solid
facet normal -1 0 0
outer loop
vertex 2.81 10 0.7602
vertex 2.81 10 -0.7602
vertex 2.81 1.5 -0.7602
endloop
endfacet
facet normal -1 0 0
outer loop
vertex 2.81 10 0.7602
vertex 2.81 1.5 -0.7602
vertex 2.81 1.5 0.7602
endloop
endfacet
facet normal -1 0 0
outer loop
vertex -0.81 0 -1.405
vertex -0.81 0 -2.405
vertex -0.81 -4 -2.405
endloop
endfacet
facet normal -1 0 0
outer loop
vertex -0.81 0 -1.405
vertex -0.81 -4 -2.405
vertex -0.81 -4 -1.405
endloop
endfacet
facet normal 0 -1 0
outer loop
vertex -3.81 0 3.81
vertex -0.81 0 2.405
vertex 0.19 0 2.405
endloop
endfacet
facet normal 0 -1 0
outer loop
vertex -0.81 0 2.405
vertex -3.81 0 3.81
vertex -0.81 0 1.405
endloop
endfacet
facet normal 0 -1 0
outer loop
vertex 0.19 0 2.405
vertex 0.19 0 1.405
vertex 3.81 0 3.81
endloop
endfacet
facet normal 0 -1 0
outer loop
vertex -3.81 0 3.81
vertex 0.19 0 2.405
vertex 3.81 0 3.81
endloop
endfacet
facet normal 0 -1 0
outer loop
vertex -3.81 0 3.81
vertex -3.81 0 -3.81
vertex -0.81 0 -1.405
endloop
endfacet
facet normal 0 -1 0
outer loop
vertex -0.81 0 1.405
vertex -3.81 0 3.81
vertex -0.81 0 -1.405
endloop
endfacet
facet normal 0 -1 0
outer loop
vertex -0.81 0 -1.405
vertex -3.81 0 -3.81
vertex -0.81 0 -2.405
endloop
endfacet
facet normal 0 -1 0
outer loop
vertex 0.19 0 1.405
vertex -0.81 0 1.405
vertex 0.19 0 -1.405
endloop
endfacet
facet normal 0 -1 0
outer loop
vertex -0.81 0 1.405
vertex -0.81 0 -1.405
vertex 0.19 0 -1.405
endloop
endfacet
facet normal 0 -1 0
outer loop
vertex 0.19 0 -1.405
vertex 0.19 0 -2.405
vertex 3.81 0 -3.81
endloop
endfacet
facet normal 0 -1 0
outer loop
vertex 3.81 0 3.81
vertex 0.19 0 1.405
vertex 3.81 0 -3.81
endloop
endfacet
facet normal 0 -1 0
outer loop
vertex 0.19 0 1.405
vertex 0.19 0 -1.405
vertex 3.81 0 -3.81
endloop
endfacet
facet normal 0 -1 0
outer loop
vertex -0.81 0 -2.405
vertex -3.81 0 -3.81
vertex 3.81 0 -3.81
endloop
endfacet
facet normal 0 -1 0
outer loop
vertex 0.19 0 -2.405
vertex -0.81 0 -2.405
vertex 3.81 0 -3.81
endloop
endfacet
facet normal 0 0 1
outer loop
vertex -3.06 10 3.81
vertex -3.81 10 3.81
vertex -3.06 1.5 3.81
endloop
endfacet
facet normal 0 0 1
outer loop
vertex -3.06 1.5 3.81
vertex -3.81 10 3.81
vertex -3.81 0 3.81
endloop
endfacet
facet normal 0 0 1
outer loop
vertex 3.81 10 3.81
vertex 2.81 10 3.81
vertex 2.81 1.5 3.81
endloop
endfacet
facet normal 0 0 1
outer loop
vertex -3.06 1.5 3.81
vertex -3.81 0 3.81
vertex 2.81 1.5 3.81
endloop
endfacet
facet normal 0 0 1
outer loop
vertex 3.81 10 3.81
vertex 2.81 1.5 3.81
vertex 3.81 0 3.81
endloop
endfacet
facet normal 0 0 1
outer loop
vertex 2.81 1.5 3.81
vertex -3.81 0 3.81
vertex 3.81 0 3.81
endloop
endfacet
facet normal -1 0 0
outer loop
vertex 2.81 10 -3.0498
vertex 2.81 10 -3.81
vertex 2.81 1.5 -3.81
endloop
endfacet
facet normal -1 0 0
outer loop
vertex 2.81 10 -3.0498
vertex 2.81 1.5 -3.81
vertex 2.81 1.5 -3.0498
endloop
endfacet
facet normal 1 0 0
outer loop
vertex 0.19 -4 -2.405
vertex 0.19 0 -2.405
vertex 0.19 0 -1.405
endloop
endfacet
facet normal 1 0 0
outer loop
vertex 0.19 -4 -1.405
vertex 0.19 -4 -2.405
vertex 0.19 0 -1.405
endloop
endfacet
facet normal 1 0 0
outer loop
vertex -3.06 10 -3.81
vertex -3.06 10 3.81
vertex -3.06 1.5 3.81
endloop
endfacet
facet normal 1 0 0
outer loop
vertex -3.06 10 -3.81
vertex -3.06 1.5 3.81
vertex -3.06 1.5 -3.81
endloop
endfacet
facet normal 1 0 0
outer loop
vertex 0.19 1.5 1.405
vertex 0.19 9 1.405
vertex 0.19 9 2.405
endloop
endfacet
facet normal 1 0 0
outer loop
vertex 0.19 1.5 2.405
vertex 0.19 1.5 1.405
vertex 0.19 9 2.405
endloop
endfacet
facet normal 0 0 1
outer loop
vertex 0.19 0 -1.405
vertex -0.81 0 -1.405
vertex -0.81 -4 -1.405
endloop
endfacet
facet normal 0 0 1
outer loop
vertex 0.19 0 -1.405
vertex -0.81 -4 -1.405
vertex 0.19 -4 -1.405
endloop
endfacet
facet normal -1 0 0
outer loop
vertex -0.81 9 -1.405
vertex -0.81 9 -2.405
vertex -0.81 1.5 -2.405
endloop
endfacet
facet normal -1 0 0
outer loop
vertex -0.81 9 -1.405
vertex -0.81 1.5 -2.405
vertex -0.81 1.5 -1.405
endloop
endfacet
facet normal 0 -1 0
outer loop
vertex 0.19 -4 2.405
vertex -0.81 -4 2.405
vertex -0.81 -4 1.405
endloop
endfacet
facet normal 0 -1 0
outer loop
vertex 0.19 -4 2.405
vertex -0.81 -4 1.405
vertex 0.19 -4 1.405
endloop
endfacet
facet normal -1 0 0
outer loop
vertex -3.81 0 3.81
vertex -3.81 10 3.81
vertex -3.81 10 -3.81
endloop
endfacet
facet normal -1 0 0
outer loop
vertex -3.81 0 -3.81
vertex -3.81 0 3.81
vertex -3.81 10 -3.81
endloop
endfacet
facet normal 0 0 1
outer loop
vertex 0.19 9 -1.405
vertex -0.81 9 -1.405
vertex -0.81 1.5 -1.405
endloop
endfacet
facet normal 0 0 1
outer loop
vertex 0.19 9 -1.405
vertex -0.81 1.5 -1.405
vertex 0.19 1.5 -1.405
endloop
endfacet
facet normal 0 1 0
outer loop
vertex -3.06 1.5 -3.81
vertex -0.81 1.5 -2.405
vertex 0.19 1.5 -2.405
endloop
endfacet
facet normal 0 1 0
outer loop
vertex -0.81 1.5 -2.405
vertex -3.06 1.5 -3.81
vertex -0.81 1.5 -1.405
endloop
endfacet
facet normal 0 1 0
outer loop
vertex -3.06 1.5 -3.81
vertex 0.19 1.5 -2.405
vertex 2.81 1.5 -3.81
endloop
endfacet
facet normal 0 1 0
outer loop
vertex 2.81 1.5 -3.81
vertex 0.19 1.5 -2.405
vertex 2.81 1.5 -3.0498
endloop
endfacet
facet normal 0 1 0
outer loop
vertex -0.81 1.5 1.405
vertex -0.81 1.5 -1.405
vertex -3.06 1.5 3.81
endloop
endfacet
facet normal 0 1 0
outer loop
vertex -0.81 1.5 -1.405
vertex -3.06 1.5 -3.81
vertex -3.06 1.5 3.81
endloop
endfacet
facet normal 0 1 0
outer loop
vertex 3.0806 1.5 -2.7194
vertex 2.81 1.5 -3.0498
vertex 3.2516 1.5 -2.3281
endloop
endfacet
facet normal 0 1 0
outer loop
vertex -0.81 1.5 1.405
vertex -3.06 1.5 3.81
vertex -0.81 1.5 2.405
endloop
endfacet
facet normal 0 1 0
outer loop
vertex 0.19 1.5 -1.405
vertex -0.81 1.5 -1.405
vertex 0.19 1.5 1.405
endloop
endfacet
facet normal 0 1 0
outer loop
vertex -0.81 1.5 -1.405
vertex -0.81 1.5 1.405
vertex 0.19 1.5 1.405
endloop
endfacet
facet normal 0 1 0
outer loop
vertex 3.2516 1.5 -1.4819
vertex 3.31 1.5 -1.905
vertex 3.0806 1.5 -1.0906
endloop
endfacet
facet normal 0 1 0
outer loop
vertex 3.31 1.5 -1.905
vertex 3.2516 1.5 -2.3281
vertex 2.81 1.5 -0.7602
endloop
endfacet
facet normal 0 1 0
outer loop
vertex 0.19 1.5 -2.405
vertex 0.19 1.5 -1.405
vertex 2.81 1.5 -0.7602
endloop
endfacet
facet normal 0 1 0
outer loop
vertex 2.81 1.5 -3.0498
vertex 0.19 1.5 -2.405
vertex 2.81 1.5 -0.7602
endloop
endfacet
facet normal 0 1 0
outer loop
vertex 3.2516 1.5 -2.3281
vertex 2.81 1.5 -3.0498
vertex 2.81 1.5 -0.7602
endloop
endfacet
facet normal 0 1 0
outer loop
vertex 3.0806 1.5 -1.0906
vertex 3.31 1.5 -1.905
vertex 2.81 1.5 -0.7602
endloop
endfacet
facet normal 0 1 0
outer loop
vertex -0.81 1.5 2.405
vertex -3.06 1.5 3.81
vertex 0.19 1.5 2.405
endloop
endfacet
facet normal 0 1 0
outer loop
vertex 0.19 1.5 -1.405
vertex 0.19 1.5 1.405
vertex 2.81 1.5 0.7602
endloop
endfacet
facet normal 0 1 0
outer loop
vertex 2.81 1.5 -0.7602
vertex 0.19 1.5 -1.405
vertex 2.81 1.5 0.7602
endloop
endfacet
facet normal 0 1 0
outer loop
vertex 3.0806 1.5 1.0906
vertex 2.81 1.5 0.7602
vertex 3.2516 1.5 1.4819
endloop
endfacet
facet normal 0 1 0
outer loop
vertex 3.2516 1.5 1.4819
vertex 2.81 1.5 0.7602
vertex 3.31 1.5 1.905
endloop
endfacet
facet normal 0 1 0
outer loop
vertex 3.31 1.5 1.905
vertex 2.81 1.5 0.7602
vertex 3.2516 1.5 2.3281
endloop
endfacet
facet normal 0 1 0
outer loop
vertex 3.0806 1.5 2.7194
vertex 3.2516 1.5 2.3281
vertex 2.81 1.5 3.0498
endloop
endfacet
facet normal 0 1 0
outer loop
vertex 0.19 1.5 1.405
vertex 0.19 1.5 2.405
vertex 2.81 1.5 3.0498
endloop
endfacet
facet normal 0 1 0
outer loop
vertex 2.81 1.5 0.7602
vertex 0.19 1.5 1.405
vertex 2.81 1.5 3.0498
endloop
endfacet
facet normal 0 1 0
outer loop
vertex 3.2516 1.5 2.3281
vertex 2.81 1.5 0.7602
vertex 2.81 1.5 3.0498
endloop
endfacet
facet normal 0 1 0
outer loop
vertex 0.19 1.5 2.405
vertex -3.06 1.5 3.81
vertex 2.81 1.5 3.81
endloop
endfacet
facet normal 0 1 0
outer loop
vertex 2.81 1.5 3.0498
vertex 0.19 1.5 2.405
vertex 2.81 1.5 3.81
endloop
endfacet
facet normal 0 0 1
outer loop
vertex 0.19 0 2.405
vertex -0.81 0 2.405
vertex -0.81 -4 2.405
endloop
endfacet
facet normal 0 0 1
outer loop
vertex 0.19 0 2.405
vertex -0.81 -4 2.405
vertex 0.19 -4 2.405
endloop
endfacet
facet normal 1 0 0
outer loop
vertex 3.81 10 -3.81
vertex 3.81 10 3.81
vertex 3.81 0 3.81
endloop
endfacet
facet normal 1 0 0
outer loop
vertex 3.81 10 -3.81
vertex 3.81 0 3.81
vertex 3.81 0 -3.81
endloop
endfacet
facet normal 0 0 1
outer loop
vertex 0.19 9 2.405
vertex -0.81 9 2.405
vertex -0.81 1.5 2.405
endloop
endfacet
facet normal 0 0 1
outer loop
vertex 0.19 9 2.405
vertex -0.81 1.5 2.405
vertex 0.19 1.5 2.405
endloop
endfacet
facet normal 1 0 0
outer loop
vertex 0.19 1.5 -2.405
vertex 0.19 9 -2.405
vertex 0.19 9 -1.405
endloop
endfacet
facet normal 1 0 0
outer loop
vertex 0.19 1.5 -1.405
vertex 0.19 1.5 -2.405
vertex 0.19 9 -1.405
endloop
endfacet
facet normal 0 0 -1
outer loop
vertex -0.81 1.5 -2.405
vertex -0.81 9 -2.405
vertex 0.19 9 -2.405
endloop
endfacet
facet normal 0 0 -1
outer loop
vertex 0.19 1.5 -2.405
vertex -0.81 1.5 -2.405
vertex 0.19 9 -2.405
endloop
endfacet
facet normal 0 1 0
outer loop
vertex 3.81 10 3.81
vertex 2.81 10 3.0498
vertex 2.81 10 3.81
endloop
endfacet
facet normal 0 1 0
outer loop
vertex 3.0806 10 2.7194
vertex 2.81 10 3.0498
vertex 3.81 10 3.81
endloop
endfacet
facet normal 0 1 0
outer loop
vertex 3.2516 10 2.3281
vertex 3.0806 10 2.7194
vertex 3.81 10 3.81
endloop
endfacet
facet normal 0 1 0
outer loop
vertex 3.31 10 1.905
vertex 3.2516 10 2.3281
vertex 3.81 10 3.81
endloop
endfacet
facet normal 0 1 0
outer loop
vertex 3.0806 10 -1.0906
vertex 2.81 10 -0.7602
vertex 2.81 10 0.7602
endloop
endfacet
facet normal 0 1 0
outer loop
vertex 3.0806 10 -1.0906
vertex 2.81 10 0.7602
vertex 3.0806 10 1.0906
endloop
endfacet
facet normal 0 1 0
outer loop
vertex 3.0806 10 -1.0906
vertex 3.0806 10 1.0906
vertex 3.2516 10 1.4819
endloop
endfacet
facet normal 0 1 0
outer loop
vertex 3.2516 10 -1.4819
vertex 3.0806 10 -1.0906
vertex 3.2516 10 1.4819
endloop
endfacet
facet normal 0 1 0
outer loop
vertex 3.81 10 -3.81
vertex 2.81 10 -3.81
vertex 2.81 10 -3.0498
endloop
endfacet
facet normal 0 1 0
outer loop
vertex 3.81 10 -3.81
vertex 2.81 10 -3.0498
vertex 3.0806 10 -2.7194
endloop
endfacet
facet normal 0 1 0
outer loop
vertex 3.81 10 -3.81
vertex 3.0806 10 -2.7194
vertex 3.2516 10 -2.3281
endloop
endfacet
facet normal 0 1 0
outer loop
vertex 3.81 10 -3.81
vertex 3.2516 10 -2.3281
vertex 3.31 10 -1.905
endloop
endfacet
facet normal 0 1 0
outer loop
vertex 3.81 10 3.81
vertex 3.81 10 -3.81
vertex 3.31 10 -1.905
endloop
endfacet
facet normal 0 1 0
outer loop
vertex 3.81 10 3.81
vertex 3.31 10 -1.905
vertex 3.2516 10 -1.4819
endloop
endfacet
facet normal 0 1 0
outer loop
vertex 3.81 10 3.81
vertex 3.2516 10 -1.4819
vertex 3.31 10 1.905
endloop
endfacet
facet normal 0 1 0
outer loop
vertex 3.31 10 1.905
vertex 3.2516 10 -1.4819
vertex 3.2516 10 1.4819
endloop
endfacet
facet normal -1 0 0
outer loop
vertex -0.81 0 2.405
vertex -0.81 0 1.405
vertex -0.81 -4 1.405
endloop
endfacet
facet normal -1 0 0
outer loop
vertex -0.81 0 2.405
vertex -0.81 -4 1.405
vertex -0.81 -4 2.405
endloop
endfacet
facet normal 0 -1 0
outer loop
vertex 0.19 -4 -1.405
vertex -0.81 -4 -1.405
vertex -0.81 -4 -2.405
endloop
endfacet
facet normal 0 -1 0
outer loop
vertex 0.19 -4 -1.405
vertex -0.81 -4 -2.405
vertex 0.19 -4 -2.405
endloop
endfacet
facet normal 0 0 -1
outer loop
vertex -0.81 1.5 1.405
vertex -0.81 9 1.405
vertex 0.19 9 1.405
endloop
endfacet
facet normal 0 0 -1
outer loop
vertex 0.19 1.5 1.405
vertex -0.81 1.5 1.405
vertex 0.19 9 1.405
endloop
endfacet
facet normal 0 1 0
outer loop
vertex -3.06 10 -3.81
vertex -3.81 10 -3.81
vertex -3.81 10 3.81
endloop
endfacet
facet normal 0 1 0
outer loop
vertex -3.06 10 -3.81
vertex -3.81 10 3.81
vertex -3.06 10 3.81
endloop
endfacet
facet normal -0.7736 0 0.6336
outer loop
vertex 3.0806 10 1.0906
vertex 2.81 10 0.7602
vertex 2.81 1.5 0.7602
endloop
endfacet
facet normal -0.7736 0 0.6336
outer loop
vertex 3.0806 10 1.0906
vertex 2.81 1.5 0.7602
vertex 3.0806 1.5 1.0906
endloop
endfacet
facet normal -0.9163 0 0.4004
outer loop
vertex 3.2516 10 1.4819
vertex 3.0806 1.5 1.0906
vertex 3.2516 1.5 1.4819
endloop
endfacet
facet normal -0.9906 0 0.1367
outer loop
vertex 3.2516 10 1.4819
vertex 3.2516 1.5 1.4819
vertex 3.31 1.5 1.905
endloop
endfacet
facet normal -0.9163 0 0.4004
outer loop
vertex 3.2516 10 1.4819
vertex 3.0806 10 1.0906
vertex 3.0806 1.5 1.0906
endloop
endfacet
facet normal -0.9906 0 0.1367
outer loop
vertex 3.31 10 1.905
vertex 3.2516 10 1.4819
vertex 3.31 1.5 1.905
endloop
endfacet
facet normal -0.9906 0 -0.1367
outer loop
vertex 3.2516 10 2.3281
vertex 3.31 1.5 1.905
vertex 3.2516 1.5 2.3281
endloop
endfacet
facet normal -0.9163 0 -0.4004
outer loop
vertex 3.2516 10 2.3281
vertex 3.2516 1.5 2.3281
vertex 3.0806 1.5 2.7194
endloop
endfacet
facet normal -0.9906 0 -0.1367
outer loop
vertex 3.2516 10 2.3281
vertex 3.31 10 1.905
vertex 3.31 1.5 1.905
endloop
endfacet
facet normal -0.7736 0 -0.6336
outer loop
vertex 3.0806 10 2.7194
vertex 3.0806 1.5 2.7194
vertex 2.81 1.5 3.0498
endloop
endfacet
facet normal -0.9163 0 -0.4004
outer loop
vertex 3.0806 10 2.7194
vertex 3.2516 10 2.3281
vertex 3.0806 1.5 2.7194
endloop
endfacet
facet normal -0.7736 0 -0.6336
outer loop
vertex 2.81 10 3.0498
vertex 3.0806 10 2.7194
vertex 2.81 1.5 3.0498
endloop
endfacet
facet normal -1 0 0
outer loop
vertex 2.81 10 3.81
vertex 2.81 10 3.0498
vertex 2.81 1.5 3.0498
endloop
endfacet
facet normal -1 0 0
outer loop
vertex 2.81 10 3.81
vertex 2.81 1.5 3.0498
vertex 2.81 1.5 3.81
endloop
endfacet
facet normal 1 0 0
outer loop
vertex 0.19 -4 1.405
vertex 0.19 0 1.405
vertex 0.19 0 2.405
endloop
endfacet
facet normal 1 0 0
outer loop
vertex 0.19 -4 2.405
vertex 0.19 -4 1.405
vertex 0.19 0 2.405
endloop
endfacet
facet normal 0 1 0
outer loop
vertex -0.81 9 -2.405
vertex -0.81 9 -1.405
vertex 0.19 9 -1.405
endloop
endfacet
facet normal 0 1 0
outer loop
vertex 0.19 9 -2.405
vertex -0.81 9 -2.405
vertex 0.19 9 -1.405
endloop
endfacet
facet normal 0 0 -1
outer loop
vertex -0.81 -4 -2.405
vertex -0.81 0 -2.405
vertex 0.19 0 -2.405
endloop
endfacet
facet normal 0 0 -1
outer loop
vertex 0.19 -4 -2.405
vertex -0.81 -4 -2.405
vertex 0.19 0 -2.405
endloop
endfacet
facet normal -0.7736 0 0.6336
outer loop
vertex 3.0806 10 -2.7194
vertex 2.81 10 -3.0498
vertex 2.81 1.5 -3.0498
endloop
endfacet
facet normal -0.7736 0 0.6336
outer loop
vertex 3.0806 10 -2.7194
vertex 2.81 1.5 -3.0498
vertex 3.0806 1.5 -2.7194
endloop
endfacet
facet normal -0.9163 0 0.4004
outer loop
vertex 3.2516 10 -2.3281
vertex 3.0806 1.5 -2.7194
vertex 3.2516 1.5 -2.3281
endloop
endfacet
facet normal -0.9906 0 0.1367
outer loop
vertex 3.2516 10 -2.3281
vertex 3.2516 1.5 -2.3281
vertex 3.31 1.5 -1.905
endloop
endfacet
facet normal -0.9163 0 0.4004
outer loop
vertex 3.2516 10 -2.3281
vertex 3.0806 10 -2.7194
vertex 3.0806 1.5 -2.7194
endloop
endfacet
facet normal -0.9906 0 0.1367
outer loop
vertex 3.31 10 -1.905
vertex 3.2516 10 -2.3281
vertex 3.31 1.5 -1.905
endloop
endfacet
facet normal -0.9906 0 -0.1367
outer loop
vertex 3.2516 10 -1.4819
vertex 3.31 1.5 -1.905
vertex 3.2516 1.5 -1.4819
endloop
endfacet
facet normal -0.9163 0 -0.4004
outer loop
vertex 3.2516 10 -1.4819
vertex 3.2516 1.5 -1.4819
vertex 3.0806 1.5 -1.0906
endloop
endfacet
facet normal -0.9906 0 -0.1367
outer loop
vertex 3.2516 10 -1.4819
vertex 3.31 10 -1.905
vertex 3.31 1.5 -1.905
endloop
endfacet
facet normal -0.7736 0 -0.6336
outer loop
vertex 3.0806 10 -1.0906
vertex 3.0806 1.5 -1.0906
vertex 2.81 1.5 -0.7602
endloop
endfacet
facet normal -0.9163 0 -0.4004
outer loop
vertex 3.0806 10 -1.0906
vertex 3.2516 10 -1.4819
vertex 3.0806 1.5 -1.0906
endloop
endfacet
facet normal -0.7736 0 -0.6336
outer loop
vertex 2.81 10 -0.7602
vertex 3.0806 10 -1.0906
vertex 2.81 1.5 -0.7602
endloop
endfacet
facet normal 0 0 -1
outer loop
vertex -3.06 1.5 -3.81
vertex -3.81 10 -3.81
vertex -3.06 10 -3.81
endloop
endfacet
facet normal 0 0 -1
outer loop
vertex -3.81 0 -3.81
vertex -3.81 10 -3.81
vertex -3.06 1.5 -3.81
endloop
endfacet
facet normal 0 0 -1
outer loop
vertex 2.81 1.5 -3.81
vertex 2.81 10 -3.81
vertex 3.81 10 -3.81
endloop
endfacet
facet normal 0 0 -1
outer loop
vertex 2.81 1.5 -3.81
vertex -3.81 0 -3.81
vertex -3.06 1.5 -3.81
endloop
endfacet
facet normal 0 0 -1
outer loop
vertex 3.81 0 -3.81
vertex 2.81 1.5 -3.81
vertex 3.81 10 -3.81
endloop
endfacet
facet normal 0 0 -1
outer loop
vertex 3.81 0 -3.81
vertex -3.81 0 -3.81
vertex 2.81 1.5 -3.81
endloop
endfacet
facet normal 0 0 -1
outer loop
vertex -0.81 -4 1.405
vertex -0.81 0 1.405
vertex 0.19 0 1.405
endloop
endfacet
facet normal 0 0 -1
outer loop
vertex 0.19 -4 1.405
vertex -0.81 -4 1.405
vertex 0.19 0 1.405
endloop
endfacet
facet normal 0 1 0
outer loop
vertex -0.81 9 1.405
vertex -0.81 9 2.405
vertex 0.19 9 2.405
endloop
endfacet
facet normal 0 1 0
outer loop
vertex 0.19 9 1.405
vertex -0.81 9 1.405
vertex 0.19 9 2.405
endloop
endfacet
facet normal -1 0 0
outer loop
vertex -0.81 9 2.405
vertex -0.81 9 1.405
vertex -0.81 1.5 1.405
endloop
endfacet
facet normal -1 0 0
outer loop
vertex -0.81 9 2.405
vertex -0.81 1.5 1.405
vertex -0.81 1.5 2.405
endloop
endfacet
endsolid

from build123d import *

# Parameters (mm, degrees)
SKETCH_1_W           = 7.62
SKETCH_1_H           = 7.62
EXTRUDE_1_DEPTH      = 10
CUT_EXTRUDE_1_DEPTH  = 8.5
EXTRUDE_2_DEPTH      = 4
EXTRUDE_2_DEPTH_BACK = 9
SKETCH_3_W           = 1
SKETCH_3_H           = 1


with BuildPart() as part:
    # 草图1 → 拉伸1 (new body)
    with BuildSketch(Plane(origin=(0, 0, 0), x_dir=(1, 0, 0), z_dir=(0, 1, 0))):
        Rectangle(SKETCH_1_W, SKETCH_1_H)
    extrude(amount=EXTRUDE_1_DEPTH)

    # 草图2 → 切除-拉伸1 (cut)
    with BuildSketch(Plane(origin=(0, 10, 0), x_dir=(-1, 0, 0), z_dir=(0, 1, 0))):
        with BuildLine():
            Line((-2.81, -3.81), (-2.81, -3.049818304))
            ThreePointArc((-2.81, -3.049818304), (-3.31, -1.905), (-2.81, -0.760181696))
            Line((-2.81, -0.760181696), (-2.81, 0.760181696))
            ThreePointArc((-2.81, 0.760181696), (-3.31, 1.905), (-2.81, 3.049818304))
            Line((-2.81, 3.049818304), (-2.81, 3.81))
            Line((-2.81, 3.81), (3.06, 3.81))
            Line((3.06, 3.81), (3.06, -3.81))
            Line((3.06, -3.81), (-2.81, -3.81))
        make_face()
    extrude(amount=-CUT_EXTRUDE_1_DEPTH, mode=Mode.SUBTRACT)

    # 草图3 → 拉伸2 (add, two sides: drawn at the far end of the back side and taken through both)
    with BuildSketch(Plane.XZ.offset(-EXTRUDE_2_DEPTH_BACK)):
        with Locations((-0.31, 1.905)):
            Rectangle(SKETCH_3_W, SKETCH_3_H)
        with Locations((-0.31, -1.905)):
            Rectangle(SKETCH_3_W, SKETCH_3_H)
    extrude(amount=EXTRUDE_2_DEPTH + EXTRUDE_2_DEPTH_BACK)


solid = part.part
